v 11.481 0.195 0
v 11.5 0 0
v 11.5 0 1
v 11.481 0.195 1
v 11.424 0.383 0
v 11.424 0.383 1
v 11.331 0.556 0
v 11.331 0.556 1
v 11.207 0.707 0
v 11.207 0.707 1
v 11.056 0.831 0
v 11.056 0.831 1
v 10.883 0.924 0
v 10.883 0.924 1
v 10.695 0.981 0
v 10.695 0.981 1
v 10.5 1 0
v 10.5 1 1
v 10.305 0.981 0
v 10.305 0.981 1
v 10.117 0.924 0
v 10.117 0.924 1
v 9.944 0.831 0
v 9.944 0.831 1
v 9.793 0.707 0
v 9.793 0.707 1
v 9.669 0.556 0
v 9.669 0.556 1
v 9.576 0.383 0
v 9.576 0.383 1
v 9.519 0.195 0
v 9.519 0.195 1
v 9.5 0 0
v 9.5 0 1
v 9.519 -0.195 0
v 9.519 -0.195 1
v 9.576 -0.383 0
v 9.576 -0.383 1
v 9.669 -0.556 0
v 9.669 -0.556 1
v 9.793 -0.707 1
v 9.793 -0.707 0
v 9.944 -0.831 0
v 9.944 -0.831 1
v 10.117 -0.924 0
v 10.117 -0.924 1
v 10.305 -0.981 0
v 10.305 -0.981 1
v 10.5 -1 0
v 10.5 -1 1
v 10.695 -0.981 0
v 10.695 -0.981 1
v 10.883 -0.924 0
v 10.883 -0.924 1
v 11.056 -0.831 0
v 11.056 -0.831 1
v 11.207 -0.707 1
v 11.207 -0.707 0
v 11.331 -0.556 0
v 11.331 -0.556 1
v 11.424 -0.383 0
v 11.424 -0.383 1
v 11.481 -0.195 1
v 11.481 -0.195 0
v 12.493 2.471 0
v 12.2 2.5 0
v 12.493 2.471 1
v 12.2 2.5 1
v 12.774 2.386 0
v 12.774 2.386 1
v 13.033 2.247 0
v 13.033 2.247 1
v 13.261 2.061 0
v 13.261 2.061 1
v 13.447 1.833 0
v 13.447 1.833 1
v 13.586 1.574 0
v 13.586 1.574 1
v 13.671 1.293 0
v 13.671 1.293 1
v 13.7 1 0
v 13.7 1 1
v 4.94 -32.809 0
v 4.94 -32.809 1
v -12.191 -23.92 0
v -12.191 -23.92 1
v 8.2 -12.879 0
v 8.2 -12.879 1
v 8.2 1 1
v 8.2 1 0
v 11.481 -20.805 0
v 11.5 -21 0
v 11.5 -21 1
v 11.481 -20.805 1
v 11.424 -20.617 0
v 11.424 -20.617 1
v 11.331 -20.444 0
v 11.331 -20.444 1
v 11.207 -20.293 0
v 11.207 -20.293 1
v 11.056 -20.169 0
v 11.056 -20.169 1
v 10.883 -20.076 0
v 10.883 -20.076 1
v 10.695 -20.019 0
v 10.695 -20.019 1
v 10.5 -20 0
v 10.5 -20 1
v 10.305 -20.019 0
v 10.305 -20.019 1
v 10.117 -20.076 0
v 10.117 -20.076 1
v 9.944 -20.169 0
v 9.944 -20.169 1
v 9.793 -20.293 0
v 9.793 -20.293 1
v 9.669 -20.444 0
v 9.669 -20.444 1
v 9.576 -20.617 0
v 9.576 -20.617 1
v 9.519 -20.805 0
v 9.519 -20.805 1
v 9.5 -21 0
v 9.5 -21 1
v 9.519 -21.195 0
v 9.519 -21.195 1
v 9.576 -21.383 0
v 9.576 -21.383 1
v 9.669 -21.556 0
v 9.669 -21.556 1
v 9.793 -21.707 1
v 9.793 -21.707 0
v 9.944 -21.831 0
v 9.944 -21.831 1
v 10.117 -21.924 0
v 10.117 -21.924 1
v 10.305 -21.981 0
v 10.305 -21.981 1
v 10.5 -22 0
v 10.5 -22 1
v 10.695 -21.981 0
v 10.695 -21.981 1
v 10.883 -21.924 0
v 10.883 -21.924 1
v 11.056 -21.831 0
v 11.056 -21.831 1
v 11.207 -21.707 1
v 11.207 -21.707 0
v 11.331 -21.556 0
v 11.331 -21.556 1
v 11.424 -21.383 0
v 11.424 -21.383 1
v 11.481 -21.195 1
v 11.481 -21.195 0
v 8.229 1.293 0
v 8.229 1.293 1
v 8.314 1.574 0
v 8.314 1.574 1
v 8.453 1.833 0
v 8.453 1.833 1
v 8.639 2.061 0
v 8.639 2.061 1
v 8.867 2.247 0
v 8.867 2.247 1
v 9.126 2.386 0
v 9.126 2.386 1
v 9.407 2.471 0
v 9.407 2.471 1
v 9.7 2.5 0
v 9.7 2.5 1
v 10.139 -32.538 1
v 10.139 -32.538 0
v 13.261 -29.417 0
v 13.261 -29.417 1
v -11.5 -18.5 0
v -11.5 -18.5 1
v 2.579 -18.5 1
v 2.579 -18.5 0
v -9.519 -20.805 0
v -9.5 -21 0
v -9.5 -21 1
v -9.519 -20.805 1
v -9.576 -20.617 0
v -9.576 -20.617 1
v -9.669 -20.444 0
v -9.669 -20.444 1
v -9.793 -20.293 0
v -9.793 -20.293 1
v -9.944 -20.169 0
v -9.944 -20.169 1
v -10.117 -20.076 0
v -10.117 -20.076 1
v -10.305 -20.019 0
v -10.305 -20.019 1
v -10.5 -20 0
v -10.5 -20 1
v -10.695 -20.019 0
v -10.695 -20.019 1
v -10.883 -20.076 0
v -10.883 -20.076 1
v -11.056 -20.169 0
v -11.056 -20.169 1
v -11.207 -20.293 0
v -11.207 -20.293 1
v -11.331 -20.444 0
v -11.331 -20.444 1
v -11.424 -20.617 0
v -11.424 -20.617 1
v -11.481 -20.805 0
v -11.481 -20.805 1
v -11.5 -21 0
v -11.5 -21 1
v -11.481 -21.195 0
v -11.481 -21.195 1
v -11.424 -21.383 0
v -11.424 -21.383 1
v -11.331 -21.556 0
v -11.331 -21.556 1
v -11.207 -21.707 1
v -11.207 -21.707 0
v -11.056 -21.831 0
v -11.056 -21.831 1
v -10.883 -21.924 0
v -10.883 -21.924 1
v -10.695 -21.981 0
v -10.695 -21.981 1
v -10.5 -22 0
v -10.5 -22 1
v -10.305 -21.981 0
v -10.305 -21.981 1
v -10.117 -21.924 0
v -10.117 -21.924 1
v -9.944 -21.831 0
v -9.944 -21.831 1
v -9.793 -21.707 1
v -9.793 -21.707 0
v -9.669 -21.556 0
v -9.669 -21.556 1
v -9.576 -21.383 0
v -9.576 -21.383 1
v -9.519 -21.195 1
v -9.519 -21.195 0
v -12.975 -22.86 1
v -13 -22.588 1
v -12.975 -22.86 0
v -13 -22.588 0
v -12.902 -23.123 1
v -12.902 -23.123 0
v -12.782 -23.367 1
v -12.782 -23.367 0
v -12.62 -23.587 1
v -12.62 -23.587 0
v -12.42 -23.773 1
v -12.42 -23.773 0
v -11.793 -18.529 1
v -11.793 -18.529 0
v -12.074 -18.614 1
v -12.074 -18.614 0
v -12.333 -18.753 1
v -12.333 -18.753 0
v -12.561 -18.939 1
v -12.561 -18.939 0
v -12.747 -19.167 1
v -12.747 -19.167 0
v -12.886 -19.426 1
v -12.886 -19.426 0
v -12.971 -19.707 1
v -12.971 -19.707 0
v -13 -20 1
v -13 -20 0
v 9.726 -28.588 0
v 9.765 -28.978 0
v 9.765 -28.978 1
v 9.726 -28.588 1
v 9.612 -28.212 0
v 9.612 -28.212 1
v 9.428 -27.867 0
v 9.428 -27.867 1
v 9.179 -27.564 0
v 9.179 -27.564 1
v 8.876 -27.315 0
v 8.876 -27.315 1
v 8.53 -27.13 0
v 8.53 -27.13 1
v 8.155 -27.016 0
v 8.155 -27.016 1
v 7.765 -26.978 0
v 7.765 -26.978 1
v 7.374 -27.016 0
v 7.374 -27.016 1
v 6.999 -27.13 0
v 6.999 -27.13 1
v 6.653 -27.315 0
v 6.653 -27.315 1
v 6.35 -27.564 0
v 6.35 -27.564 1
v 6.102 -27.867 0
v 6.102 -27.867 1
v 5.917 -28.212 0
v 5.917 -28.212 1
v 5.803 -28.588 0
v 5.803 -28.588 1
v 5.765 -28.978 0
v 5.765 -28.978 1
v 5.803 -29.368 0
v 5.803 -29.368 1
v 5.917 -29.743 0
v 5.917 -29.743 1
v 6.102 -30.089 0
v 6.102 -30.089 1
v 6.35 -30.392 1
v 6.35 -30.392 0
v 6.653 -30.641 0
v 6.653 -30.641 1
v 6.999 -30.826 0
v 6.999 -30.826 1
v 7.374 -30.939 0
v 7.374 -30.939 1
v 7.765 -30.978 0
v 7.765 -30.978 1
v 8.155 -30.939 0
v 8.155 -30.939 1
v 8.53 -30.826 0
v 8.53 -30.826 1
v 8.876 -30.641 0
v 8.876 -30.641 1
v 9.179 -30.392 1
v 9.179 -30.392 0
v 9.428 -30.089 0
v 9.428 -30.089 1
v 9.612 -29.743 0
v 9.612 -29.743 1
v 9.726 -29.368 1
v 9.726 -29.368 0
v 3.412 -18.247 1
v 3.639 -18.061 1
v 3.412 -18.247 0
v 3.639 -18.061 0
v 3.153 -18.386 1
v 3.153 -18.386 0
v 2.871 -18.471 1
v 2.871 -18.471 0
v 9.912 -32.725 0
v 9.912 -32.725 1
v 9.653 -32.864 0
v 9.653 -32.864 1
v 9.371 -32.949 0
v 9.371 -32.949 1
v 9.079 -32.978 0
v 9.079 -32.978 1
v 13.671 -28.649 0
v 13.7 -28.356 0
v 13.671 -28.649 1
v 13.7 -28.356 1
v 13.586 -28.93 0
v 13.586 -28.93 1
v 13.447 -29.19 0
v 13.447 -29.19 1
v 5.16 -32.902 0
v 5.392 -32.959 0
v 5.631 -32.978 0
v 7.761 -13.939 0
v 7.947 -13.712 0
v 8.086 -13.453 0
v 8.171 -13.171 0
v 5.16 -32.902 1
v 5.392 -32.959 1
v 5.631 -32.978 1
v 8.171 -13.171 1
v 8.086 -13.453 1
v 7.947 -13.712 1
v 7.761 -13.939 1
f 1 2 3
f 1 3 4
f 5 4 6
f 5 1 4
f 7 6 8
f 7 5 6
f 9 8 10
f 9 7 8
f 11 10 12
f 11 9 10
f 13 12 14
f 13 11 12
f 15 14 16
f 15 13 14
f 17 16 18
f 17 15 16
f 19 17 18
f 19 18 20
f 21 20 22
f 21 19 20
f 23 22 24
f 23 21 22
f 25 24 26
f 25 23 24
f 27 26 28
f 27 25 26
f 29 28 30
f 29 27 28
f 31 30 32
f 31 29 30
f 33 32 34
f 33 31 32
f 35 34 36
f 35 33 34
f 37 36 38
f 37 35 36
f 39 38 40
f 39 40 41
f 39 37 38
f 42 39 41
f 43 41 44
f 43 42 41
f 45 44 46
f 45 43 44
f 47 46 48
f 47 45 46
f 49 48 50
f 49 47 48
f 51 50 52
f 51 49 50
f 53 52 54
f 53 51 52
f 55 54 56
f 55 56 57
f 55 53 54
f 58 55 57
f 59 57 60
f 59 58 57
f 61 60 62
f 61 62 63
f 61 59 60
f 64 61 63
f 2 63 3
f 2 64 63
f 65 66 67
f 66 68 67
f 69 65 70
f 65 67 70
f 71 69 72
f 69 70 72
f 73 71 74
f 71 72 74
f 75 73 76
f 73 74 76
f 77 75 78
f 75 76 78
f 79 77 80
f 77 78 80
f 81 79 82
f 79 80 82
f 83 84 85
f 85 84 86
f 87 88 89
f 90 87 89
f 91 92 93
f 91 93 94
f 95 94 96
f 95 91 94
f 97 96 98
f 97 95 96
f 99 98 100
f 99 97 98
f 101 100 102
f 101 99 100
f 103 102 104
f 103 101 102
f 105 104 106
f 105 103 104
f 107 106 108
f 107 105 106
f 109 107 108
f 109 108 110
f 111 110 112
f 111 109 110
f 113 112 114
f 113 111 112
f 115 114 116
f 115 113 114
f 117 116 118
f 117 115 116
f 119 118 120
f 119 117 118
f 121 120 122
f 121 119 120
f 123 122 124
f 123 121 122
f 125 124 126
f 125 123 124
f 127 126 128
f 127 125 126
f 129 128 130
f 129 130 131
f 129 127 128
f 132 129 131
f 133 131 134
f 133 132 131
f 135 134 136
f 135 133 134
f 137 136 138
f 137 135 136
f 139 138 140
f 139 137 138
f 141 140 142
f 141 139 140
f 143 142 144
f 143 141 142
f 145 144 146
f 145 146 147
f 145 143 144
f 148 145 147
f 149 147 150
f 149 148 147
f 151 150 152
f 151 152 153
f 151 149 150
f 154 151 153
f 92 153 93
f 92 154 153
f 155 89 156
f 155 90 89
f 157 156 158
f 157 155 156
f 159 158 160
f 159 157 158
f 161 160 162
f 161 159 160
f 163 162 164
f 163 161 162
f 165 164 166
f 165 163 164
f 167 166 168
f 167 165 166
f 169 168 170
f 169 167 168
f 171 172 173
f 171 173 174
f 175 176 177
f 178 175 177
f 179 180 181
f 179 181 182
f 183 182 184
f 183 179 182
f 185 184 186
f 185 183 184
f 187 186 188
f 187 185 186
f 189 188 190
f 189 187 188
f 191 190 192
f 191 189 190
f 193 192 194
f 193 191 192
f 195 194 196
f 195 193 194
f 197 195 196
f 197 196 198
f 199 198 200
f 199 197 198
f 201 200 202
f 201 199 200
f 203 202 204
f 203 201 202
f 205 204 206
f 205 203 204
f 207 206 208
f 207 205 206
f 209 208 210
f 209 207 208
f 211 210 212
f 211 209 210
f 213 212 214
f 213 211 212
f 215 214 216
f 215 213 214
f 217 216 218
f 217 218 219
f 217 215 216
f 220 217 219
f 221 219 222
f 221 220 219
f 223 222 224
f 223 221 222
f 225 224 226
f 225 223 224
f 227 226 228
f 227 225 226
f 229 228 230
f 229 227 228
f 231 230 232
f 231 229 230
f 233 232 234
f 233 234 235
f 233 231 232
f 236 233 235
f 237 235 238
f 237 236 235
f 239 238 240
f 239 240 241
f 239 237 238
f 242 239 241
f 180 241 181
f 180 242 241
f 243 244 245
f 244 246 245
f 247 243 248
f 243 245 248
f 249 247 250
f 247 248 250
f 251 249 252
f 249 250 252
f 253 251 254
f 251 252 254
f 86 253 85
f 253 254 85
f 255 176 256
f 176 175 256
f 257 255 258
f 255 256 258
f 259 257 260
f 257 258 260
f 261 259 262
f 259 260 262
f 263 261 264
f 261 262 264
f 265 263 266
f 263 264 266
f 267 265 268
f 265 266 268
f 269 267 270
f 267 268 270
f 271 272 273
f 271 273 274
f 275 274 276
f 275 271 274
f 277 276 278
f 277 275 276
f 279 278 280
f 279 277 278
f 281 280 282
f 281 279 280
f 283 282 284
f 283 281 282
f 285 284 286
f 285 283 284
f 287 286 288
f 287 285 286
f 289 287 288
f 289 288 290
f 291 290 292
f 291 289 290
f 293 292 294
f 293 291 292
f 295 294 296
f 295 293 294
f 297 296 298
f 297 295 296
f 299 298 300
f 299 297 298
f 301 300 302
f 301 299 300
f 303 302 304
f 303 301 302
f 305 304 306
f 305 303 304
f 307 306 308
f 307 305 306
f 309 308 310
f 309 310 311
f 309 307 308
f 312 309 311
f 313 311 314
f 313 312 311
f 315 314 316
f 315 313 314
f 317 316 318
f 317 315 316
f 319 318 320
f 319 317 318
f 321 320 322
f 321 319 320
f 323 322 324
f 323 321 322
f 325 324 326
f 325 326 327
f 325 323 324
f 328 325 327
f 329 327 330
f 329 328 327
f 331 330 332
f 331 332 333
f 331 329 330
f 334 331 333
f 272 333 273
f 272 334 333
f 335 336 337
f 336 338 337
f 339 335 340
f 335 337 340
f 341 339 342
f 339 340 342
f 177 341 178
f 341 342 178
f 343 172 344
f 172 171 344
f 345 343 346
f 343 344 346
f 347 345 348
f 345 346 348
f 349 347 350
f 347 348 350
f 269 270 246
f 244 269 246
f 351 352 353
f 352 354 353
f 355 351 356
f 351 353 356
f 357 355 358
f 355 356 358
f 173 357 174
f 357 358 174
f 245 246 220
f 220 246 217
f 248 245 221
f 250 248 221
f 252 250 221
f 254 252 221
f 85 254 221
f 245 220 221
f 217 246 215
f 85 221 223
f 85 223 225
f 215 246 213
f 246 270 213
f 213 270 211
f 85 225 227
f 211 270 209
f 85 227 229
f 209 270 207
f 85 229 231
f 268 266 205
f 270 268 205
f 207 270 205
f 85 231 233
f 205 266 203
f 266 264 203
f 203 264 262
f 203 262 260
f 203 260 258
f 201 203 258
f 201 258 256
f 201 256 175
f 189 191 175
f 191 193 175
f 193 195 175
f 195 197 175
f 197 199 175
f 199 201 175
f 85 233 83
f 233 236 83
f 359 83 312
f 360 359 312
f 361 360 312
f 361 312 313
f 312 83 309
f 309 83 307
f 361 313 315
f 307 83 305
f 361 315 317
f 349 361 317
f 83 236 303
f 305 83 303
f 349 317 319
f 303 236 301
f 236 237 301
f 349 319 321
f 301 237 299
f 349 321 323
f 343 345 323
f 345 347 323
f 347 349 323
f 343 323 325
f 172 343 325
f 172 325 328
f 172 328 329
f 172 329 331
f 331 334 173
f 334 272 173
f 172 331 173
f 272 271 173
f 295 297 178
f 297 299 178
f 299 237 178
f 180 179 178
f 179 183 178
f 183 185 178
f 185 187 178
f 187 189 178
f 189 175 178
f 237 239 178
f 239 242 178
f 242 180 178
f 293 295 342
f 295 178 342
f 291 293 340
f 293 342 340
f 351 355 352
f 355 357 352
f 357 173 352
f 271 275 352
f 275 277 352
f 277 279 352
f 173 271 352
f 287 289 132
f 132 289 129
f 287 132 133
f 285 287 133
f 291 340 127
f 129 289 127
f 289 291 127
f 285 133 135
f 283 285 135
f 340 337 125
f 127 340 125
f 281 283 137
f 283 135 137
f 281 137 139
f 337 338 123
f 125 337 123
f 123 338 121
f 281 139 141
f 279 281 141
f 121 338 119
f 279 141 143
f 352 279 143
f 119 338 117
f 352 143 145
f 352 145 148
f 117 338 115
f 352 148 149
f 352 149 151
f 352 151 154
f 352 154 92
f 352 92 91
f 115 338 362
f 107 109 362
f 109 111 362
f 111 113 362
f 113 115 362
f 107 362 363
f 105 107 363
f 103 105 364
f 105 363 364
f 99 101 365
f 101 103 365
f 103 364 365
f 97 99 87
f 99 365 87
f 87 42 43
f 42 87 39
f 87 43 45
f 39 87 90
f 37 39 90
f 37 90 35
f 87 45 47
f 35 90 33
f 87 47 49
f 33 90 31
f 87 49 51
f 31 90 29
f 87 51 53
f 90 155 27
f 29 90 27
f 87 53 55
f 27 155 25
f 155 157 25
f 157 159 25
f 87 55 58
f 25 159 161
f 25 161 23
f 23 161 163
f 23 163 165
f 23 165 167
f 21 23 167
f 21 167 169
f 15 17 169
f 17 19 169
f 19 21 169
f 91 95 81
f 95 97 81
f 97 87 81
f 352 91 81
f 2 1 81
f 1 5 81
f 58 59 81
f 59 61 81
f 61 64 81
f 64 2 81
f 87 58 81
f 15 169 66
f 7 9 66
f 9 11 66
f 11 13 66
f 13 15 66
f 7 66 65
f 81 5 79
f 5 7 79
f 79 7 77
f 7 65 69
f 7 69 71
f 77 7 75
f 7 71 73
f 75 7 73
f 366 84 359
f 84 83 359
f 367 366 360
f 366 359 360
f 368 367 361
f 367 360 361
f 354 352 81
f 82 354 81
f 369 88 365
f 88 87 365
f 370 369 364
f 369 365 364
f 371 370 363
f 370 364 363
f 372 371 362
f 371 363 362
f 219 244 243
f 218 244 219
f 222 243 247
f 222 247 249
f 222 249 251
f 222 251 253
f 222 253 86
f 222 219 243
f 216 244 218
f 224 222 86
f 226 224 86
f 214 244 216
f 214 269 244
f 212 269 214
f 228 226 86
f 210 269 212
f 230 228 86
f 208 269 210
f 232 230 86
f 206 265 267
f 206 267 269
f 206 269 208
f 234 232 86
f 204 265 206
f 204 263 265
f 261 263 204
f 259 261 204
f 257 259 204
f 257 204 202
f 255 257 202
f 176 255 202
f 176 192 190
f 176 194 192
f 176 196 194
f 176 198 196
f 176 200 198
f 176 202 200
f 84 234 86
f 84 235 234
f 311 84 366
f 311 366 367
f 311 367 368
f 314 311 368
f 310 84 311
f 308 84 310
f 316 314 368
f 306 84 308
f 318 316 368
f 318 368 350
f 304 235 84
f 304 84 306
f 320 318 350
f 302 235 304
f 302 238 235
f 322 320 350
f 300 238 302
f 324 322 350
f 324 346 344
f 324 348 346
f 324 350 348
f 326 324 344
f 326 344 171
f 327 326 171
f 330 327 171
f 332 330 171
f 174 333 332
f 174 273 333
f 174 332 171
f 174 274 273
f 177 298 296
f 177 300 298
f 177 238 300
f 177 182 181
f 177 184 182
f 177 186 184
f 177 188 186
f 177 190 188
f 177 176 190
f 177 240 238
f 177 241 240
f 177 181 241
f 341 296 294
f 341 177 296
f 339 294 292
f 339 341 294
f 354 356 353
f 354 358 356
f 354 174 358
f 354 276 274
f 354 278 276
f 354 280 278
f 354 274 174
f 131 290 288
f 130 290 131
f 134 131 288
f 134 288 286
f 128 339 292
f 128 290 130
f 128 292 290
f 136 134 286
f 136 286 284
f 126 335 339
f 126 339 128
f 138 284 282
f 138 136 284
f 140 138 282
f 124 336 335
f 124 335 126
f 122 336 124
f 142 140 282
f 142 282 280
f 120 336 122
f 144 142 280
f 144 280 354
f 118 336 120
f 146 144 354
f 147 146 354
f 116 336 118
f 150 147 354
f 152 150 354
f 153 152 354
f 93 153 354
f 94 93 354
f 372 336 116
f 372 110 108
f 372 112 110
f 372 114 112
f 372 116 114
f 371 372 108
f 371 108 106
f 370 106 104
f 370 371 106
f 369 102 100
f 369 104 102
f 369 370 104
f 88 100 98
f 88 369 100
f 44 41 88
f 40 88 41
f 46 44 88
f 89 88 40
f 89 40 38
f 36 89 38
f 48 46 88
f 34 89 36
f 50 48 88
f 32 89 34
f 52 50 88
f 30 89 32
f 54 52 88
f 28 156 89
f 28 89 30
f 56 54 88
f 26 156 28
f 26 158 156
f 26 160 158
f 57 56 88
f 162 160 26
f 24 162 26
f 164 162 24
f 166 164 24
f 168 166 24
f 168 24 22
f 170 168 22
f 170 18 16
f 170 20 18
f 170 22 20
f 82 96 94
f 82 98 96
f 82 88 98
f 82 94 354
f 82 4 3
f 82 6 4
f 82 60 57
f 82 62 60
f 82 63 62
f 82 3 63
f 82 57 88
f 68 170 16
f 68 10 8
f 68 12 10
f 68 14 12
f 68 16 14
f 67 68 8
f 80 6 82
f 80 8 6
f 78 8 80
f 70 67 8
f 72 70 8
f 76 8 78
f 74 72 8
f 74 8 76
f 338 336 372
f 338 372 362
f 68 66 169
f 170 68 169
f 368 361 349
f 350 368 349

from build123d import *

# Parameters (mm, degrees)
F0_R     = 1
F0_R_2   = 2
F1_DEPTH = 1
F2_R     = 1
F3_DEPTH = 1
F4_SIZE  = 4
F5_SIZE  = 5
F6_R     = 1.5


with BuildPart() as f1:
    # F0 (on Top) → F1 (new body)
    with BuildSketch(Plane.XY):
        with BuildLine():
            Line((-6.25, 2.5), (-6.25, 0))
            ThreePointArc((-6.25, 0), (0, -6.25), (6.25, 0))
            Line((6.25, 0), (6.25, 2.5))
            Line((6.25, 2.5), (-6.25, 2.5))
        make_face()
        with BuildLine():
            ThreePointArc((6.25, 0), (0, -6.25), (-6.25, 0))
            Line((-6.25, 0), (-6.25, 2.5))
            Line((-6.25, 2.5), (-13, 2.5))
            Line((-13, 2.5), (-13, -4.25))
            Line((-13, -4.25), (-10.5, -4.25))
            ThreePointArc((-10.5, -4.25), (-4.25, -10.5), (-10.5, -16.75))
            Line((-10.5, -16.75), (-13, -16.75))
            Line((-13, -16.75), (-13, -32.9777747887))
            Line((-13, -32.9777747887), (13.7, -32.9777747887))
            Line((13.7, -32.9777747887), (13.7, 2.5))
            Line((13.7, 2.5), (6.25, 2.5))
            Line((6.25, 2.5), (6.25, 0))
        make_face()
        with Locations((-10.5, -21)):
            Circle(F0_R, mode=Mode.SUBTRACT)
        with Locations((7.7645713531, -28.9777747887)):
            Circle(F0_R_2, mode=Mode.SUBTRACT)
        with Locations((10.5, -21)):
            Circle(F0_R, mode=Mode.SUBTRACT)
        with Locations((-10.5, 0)):
            Circle(F0_R, mode=Mode.SUBTRACT)
        with Locations((10.5, 0)):
            Circle(F0_R, mode=Mode.SUBTRACT)
    extrude(amount=F1_DEPTH)

    # F2 (on face) → F3 (cut, through all)
    with BuildSketch(Plane.XY.offset(1)):
        Polygon((5.2645713531, -32.9777747887), (-13, -23.5), (-13, -32.9777747887), align=None)
        with BuildLine():
            Line((-13, -16.75), (-13, -18.5))
            Line((-13, -18.5), (8.2, -18.5))
            Line((8.2, -18.5), (8.2, 2.5))
            Line((8.2, 2.5), (-13, 2.5))
            Line((-13, 2.5), (-13, -4.25))
            Line((-13, -4.25), (-10.5, -4.25))
            ThreePointArc((-10.5, -4.25), (-4.25, -10.5), (-10.5, -16.75))
            Line((-10.5, -16.75), (-13, -16.75))
        make_face()
        with Locations((-10.5, 0)):
            Circle(F2_R, mode=Mode.SUBTRACT)
    extrude(amount=-F3_DEPTH, mode=Mode.SUBTRACT)

    # F4
    f4_edges = [f1.edges().sort_by_distance(p)[0] for p in [
        (13.7, -32.977775, 0.5),
    ]]
    chamfer(f4_edges, length=F4_SIZE)

    # F5
    f5_edges = [f1.edges().sort_by_distance(p)[0] for p in [
        (8.2, -18.5, 0.5),
    ]]
    chamfer(f5_edges, length=F5_SIZE)

    # F6
    f6_edges = [f1.edges().sort_by_distance(p)[0] for p in [
        (-13, -23.5, 0.5),
        (5.264571, -32.977775, 0.5),
        (9.7, -32.977775, 0.5),
        (13.7, -28.977775, 0.5),
        (8.2, -13.5, 0.5),
        (3.2, -18.5, 0.5),
        (-13, -18.5, 0.5),
        (13.7, 2.5, 0.5),
        (8.2, 2.5, 0.5),
    ]]
    fillet(f6_edges, radius=F6_R)


solid = f1.part
